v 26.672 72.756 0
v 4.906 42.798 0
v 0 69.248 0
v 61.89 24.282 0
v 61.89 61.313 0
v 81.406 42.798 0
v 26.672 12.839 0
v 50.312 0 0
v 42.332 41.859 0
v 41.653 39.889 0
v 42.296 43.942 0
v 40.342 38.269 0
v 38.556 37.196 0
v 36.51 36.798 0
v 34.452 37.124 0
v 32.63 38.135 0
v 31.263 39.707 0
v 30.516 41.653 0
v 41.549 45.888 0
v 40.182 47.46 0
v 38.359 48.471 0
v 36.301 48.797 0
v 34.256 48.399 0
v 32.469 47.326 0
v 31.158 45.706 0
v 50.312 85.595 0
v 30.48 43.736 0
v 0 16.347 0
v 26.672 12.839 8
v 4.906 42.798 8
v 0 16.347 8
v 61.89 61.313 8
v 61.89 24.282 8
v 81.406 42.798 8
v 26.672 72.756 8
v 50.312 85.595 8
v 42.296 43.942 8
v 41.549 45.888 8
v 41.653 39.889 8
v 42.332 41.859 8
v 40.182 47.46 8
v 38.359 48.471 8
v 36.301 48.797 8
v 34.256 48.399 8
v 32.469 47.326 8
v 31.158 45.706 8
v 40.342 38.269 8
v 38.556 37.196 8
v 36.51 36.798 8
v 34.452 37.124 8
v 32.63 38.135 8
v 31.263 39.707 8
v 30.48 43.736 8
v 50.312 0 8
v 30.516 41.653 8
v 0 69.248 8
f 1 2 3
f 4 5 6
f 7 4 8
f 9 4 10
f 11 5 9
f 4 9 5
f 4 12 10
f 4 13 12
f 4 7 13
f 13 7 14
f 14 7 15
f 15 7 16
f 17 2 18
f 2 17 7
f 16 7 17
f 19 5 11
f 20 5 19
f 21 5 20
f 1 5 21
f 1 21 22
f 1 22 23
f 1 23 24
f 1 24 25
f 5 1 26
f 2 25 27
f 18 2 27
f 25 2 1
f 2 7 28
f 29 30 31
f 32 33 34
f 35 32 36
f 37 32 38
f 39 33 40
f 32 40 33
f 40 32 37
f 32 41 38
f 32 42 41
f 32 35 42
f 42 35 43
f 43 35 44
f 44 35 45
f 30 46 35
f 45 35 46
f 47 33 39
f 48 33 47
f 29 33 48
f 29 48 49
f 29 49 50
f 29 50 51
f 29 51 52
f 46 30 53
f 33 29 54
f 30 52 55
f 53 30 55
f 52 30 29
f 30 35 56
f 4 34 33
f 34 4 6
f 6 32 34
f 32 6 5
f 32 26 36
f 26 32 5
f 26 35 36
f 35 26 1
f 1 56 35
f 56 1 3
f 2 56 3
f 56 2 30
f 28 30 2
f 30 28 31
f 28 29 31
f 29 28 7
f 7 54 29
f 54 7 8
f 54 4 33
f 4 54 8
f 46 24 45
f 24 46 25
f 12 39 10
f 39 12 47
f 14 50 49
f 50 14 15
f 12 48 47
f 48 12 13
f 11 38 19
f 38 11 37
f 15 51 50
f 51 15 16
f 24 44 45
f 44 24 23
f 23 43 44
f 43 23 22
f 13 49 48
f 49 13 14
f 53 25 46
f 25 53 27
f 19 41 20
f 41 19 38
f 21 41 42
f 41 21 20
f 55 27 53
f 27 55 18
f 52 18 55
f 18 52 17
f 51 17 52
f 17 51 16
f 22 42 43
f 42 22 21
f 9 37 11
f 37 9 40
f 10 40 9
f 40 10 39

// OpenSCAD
$fn = 32;

// ----------------------------------------------------------------------
// Star wheel: 5-point blunt, R45
// ----------------------------------------------------------------------

// --- parameters (mm) ---
n_points = 5;             // number of points / teeth
r_out = 45;               // tip radius
r_in = 31.5;              // root radius
bore_r = 6;               // centre bore radius
plate_t = 8;              // plate thickness, Z (extrusion height)
bore_d = 12;              // centre bore diameter

profile = [[81.406, 42.798], [61.89, 61.313], [50.312, 85.595], [26.672, 72.756], [0, 69.248], [4.906, 42.798], [0, 16.347], [26.672, 12.839], [50.312, 0], [61.89, 24.282]];  // primary outline, 10 points, counter clockwise
void_1 = [[42.296, 43.942], [41.549, 45.888], [40.182, 47.46], [38.359, 48.471], [36.301, 48.797], [34.256, 48.399], [32.469, 47.326], [31.158, 45.706], [30.48, 43.736], [30.516, 41.653], [31.263, 39.707], [32.63, 38.135], [34.452, 37.124], [36.51, 36.798], [38.556, 37.196], [40.342, 38.269], [41.653, 39.889], [42.332, 41.859]];  // centre bore, 18 points

// --- the one profile operation ---
difference() {
  linear_extrude(height = plate_t) polygon(points = profile);
  translate([0, 0, -1])
    linear_extrude(height = plate_t + 2) polygon(points = void_1);
}
